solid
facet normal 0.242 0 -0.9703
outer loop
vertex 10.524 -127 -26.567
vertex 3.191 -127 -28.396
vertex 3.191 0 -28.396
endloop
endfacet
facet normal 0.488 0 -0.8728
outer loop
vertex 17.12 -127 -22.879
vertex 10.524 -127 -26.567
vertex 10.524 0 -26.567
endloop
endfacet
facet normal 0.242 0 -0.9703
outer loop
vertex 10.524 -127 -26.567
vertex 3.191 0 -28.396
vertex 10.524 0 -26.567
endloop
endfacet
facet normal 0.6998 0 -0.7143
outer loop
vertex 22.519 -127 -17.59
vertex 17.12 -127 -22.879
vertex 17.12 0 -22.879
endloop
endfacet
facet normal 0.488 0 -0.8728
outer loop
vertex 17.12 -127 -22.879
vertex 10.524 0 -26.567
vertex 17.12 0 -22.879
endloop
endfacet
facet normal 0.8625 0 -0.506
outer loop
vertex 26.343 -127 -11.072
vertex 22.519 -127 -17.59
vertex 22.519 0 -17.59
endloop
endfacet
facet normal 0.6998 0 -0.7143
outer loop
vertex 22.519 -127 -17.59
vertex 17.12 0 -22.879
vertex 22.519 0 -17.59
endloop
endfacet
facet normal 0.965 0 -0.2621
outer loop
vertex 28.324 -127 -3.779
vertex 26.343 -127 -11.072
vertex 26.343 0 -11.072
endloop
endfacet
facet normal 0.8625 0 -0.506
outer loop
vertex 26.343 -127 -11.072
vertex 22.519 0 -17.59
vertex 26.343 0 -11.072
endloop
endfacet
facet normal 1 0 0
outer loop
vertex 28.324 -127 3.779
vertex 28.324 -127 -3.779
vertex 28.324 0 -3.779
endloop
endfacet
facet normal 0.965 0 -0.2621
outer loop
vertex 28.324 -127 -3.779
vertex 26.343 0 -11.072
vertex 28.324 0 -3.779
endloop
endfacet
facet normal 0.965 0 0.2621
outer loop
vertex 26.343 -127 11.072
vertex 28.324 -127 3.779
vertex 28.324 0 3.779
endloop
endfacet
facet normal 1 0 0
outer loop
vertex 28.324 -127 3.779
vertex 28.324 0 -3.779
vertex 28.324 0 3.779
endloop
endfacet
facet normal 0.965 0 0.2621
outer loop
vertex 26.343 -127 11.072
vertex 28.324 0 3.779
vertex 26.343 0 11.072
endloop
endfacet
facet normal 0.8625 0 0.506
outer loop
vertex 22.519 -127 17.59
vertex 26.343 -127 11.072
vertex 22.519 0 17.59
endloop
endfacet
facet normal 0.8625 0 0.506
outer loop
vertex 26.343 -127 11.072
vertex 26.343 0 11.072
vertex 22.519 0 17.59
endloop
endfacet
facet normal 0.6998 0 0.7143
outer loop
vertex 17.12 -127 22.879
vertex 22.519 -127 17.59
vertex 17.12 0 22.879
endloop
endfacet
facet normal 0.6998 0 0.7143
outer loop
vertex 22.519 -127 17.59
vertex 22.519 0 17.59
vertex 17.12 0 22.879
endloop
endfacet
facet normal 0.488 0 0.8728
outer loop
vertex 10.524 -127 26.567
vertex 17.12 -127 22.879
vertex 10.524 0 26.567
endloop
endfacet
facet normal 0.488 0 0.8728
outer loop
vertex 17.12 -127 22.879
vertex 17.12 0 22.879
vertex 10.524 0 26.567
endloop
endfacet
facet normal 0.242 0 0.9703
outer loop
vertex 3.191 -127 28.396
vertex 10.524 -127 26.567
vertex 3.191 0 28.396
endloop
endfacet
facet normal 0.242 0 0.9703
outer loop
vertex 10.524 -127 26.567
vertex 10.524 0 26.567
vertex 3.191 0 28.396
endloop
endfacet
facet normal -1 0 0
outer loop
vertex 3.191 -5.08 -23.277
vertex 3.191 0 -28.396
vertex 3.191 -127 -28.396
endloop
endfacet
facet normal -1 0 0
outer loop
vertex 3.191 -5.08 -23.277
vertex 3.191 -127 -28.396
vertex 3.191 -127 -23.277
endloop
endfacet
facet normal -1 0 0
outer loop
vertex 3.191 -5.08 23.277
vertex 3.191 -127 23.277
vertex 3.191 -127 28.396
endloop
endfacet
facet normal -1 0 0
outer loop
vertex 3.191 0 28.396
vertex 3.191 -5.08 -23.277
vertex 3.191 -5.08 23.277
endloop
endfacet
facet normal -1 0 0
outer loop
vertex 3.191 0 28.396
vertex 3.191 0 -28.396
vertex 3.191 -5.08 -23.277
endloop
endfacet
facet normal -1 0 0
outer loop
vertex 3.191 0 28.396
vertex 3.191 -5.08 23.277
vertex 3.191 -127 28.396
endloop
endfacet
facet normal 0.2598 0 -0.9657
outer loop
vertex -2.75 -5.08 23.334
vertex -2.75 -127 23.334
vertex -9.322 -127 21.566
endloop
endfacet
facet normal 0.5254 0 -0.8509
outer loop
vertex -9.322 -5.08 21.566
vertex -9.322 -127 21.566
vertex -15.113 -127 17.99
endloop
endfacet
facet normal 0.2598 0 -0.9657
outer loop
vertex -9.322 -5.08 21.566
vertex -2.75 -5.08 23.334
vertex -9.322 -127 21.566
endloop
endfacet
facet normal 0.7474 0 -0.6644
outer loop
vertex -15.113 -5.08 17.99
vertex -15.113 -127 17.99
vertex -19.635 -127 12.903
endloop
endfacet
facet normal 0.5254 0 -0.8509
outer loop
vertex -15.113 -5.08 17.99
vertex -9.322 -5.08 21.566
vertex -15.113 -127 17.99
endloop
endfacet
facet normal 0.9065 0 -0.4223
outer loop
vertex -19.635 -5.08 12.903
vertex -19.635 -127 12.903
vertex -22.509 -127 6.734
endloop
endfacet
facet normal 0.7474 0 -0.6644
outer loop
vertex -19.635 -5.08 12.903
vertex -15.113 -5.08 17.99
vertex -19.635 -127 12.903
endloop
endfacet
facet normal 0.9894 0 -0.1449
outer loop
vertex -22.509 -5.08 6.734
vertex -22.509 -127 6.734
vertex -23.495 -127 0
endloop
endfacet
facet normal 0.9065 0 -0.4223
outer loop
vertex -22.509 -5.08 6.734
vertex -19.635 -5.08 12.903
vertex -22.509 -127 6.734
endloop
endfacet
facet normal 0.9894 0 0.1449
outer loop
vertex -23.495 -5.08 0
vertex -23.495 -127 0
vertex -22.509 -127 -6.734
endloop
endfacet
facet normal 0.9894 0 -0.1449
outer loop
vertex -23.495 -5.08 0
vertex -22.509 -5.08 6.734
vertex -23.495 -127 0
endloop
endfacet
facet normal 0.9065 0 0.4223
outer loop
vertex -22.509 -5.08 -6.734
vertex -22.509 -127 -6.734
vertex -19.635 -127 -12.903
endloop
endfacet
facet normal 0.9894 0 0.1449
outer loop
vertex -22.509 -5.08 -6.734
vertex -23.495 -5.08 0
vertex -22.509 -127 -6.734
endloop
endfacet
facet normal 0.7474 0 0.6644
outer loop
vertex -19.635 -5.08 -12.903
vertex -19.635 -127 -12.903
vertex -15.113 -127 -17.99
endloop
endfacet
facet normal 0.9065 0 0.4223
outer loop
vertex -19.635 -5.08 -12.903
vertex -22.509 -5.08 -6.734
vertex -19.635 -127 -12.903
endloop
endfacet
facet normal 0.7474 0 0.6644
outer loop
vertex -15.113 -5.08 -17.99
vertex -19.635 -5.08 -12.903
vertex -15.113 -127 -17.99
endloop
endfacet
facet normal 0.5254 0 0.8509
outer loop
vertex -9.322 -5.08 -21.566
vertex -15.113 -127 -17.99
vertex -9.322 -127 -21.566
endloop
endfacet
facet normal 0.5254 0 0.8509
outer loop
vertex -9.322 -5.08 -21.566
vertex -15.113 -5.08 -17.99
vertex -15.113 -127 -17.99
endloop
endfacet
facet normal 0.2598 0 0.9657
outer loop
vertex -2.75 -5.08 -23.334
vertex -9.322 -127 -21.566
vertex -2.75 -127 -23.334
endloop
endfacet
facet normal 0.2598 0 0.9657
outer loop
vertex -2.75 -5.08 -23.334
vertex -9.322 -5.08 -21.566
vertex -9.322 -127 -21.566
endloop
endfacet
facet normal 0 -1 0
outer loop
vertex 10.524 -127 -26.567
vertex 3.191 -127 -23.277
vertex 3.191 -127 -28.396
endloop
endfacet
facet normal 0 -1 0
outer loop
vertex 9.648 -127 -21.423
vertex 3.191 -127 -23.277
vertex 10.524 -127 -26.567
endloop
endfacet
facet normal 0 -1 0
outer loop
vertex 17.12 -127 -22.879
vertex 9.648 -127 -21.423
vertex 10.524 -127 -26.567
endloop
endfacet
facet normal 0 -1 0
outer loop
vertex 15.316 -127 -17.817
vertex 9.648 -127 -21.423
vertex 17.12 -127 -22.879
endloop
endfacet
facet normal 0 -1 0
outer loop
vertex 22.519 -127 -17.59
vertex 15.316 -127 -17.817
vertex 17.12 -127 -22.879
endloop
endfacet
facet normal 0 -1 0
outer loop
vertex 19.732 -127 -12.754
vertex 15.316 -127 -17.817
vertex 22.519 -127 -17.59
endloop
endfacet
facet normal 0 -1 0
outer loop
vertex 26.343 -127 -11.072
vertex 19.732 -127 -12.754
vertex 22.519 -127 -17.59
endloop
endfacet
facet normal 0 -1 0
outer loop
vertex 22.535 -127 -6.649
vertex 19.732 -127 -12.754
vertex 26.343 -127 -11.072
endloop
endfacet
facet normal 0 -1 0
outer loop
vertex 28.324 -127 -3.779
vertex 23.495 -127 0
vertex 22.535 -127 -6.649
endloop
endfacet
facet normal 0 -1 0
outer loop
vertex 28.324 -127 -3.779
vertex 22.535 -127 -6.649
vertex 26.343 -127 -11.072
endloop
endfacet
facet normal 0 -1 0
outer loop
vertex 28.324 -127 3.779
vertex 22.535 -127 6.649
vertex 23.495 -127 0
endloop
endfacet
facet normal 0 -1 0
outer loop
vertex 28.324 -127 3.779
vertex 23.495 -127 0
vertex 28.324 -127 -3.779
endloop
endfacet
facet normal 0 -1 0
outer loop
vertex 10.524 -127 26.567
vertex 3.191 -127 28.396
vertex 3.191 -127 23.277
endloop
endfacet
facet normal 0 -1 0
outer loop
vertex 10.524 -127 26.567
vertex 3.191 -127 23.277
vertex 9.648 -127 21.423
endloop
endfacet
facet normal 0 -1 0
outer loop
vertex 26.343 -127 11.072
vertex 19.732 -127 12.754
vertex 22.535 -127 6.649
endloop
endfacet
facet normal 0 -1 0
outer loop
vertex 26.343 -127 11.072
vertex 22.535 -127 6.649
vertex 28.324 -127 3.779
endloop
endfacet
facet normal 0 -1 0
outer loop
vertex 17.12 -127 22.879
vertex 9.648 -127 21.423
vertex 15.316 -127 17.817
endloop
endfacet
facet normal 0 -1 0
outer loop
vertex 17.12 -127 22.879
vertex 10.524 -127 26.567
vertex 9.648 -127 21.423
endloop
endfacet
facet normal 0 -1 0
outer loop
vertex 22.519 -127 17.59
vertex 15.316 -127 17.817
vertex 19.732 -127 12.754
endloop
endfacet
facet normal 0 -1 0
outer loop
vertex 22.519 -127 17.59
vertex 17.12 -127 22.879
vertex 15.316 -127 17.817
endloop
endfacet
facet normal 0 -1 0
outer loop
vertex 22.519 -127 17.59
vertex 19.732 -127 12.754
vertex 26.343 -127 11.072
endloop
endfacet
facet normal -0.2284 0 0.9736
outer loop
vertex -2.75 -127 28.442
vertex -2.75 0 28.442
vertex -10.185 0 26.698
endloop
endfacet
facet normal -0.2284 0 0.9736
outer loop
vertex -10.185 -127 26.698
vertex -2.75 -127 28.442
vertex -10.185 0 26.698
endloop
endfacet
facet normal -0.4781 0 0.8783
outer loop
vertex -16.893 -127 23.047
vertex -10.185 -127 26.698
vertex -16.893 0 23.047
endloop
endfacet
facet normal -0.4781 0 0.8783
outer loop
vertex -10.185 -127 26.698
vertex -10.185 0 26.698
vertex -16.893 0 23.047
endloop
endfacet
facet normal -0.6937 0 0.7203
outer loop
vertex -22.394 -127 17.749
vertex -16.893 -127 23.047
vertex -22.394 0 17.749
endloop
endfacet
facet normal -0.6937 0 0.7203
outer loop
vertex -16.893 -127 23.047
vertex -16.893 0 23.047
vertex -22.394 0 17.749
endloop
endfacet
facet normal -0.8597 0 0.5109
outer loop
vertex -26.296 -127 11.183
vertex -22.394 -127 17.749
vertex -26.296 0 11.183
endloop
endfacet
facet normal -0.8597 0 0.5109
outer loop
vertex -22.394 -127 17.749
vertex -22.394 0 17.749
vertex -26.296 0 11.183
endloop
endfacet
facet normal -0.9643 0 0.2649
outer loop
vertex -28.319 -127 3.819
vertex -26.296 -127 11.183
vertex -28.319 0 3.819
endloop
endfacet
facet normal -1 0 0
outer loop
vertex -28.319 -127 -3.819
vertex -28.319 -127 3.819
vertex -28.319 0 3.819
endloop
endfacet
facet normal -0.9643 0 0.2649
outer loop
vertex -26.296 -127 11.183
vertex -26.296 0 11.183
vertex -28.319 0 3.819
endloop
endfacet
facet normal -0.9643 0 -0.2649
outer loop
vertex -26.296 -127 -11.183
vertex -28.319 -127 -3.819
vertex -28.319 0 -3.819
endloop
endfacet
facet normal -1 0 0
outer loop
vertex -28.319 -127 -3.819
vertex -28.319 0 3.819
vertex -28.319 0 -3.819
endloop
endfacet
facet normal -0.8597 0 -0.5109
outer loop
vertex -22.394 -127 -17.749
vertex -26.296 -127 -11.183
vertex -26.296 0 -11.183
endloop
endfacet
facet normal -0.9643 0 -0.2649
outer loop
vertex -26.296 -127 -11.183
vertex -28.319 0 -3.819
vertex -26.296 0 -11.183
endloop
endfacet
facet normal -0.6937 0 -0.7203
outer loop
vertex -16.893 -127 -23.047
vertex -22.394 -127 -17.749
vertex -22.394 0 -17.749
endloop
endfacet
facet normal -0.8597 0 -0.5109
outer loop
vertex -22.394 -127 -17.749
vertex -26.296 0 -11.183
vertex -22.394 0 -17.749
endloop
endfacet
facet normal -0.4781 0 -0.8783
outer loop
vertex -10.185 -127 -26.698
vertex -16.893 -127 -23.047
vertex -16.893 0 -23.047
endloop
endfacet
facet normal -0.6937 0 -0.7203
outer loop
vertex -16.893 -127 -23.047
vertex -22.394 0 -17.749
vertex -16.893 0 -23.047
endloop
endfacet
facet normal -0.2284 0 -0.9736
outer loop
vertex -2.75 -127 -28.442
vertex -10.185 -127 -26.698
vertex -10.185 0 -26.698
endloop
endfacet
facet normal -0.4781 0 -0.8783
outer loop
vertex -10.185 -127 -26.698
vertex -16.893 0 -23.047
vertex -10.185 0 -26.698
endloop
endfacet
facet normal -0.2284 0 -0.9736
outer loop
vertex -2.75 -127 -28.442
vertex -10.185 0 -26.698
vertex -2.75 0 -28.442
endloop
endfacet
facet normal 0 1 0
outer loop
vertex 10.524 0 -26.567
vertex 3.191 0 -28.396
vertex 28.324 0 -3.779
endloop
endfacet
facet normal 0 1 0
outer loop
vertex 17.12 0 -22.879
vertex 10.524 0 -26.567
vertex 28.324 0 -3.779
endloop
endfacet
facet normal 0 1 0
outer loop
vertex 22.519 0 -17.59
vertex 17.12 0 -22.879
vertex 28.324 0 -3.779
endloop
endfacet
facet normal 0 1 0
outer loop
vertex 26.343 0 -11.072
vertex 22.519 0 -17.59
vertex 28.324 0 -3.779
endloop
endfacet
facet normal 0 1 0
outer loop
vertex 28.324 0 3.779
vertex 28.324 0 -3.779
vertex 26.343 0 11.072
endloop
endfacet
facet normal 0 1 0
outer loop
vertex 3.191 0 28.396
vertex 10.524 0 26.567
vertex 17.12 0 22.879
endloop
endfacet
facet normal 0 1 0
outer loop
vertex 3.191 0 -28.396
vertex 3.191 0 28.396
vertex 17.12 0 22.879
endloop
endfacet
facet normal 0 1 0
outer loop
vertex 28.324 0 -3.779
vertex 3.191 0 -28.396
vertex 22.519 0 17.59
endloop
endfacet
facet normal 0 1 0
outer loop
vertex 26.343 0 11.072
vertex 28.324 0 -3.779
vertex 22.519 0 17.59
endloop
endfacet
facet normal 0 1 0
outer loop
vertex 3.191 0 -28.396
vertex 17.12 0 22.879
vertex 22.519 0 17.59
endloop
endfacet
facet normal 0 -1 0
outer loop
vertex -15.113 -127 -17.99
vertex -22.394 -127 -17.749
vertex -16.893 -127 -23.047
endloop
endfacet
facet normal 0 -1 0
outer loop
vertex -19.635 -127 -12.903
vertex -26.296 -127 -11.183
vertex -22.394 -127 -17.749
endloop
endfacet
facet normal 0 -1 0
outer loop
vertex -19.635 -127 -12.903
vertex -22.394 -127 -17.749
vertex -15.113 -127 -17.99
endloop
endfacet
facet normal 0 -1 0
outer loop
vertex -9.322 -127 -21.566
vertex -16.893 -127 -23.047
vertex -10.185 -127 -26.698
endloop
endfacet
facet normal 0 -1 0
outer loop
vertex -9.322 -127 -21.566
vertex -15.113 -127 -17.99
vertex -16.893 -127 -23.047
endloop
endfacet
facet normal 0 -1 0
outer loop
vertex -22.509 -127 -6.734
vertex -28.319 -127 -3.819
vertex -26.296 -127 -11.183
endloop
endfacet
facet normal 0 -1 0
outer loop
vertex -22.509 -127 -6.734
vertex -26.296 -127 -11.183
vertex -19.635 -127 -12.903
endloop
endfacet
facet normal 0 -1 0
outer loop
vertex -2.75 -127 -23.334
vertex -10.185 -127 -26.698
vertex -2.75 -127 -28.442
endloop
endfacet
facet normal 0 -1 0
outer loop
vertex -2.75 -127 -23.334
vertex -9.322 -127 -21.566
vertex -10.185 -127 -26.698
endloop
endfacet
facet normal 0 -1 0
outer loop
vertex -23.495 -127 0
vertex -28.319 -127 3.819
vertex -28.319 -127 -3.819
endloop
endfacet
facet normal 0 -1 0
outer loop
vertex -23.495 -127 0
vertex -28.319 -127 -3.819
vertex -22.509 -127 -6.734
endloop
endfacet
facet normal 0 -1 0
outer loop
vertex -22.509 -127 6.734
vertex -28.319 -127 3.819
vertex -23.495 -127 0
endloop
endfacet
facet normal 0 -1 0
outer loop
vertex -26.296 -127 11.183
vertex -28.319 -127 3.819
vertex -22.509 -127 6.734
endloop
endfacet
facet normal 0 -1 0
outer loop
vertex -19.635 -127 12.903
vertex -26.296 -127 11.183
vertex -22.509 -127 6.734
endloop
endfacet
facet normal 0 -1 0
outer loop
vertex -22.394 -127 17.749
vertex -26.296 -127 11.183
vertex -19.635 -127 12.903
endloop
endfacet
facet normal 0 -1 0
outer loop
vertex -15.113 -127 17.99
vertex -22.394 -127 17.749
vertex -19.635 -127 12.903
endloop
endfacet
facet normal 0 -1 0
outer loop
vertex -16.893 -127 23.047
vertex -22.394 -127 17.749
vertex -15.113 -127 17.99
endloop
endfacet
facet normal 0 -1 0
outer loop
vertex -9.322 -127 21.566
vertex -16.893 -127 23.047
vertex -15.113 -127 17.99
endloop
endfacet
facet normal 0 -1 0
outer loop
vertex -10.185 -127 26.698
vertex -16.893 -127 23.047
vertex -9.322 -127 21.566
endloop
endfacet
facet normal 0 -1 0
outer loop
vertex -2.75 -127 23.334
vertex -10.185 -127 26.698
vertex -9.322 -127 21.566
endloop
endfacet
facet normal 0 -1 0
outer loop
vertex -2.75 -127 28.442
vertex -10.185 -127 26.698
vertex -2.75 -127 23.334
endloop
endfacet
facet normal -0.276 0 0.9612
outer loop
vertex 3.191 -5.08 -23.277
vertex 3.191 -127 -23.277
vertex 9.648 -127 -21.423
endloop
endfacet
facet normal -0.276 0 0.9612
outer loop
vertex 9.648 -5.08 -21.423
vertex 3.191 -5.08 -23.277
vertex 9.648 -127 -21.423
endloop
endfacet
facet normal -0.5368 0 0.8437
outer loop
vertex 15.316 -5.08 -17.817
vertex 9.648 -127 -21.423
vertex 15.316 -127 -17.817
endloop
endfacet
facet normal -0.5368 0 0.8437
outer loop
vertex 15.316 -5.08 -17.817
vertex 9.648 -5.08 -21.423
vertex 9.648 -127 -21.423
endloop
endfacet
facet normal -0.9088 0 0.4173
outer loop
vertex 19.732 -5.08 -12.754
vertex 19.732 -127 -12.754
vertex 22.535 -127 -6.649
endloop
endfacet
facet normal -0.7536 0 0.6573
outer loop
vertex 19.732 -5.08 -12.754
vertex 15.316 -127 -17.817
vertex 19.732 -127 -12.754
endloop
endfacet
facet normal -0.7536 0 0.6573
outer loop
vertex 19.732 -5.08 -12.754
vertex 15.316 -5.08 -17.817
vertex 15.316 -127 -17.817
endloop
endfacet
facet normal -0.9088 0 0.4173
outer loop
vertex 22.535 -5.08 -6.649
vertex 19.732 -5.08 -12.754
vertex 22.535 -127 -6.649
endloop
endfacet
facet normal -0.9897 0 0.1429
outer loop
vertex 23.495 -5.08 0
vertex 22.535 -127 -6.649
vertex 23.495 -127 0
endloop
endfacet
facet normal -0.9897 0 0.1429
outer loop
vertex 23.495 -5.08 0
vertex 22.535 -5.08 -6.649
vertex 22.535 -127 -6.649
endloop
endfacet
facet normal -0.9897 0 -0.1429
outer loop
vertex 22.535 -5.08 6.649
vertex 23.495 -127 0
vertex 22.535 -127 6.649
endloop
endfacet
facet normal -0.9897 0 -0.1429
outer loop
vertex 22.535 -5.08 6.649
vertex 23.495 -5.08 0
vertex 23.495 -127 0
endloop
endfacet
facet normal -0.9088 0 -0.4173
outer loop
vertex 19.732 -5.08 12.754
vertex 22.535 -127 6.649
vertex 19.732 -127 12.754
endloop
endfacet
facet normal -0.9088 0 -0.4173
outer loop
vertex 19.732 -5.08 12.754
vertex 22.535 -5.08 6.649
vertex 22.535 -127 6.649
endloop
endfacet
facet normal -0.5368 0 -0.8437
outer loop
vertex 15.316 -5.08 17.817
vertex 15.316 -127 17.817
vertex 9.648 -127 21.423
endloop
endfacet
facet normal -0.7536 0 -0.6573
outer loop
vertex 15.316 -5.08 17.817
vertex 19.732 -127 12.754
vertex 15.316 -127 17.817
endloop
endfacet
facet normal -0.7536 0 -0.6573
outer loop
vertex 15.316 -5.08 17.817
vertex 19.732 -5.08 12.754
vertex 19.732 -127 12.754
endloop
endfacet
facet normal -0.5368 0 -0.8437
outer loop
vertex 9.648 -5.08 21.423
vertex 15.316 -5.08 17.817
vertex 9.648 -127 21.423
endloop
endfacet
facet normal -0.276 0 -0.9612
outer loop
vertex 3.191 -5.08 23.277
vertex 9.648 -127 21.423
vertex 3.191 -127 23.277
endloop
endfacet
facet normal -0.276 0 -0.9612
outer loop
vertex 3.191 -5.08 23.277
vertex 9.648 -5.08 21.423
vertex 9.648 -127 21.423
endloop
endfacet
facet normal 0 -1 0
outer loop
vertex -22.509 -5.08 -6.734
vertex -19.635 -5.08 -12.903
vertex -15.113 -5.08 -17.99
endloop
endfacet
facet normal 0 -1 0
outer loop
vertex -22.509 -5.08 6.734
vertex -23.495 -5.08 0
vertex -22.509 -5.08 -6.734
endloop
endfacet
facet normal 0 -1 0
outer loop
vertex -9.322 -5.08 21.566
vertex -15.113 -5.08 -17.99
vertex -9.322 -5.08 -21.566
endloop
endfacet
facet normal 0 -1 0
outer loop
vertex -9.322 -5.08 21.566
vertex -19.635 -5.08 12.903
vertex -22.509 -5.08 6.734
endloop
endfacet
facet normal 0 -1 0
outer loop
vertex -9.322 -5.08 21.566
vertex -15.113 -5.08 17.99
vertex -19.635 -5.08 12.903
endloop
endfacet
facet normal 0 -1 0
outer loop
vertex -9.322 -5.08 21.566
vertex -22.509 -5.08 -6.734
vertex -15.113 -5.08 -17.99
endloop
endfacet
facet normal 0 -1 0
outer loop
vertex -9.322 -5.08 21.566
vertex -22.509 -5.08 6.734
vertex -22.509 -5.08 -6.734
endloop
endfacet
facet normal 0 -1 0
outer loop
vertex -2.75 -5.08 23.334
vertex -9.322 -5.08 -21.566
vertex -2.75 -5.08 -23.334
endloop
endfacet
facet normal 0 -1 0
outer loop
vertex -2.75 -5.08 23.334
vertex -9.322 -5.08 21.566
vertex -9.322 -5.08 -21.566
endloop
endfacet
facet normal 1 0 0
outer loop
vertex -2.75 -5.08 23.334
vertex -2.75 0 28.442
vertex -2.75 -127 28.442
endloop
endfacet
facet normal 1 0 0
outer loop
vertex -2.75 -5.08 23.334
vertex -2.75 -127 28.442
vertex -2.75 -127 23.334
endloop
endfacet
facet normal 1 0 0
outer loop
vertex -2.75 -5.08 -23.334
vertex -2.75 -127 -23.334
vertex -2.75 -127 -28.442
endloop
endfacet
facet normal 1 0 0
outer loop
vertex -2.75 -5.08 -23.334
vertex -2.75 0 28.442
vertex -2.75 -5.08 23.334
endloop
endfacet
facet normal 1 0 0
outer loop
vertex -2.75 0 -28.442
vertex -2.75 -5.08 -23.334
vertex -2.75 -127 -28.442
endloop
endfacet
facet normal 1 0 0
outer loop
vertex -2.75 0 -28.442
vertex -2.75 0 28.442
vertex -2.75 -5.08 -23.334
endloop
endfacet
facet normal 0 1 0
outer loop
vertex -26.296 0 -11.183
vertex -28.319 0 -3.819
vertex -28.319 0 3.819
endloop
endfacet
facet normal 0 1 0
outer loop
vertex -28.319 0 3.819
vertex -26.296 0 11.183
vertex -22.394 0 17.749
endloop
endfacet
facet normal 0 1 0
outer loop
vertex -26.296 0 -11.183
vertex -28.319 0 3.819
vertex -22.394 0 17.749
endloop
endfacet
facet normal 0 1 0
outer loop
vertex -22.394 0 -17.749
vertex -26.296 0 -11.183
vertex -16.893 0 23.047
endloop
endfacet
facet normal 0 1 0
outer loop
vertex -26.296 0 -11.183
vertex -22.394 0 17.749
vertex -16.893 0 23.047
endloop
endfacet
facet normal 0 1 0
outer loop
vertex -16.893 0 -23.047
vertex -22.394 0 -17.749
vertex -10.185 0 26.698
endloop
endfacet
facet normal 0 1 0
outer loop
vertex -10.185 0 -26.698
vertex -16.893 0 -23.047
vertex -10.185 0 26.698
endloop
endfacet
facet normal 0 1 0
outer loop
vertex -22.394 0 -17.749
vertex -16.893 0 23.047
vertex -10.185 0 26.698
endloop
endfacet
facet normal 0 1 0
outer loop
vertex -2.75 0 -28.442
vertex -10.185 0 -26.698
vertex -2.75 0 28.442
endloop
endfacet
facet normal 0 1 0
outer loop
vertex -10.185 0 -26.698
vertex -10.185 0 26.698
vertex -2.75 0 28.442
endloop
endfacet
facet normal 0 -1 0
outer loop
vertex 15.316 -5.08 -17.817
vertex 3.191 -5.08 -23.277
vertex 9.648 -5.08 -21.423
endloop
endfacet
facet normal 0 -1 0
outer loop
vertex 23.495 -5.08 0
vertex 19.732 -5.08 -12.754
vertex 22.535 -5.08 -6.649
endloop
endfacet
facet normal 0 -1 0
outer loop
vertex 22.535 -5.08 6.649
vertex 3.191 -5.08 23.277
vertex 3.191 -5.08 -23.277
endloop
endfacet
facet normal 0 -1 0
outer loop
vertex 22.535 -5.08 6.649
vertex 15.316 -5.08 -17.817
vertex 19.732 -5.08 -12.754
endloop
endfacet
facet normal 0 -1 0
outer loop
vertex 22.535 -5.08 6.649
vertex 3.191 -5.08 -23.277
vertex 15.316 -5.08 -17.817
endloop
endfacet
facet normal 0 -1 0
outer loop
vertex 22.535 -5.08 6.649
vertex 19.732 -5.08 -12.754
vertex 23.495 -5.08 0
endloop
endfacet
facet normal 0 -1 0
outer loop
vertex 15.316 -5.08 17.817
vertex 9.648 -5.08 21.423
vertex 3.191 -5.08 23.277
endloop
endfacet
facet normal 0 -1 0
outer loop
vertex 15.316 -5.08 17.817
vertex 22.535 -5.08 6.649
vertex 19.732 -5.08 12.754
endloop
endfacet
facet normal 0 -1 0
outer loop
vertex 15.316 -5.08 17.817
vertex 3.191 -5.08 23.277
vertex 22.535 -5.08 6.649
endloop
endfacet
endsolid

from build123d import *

# Parameters (mm, degrees)
F0_R     = 28.575
F1_DEPTH = 127
F2_T     = -5.08
F3_W     = 3.191248
F3_H     = 113.683276
F4_DEPTH = 609.6


with BuildPart() as f1:
    # F0 (on Front) → F1 (new body)
    with BuildSketch(Plane.XZ):
        Circle(F0_R)
    extrude(amount=F1_DEPTH)

    # F2
    f2_openings = [f1.faces().sort_by_distance(p)[0] for p in [
        (0, -127, 0),
    ]]
    offset(amount=F2_T, openings=f2_openings)

    # F3 (on Front) → F4 (cut)
    with BuildSketch(Plane.XZ):
        with Locations((1.595624, 2.158541)):
            Rectangle(F3_W, F3_H)
        Polygon((0, -54.683097), (0, 59.000179), (-2.749708, 59.000179), (-2.749708, -54.487471), align=None)
    extrude(amount=F4_DEPTH, mode=Mode.SUBTRACT)


solid = f1.part
